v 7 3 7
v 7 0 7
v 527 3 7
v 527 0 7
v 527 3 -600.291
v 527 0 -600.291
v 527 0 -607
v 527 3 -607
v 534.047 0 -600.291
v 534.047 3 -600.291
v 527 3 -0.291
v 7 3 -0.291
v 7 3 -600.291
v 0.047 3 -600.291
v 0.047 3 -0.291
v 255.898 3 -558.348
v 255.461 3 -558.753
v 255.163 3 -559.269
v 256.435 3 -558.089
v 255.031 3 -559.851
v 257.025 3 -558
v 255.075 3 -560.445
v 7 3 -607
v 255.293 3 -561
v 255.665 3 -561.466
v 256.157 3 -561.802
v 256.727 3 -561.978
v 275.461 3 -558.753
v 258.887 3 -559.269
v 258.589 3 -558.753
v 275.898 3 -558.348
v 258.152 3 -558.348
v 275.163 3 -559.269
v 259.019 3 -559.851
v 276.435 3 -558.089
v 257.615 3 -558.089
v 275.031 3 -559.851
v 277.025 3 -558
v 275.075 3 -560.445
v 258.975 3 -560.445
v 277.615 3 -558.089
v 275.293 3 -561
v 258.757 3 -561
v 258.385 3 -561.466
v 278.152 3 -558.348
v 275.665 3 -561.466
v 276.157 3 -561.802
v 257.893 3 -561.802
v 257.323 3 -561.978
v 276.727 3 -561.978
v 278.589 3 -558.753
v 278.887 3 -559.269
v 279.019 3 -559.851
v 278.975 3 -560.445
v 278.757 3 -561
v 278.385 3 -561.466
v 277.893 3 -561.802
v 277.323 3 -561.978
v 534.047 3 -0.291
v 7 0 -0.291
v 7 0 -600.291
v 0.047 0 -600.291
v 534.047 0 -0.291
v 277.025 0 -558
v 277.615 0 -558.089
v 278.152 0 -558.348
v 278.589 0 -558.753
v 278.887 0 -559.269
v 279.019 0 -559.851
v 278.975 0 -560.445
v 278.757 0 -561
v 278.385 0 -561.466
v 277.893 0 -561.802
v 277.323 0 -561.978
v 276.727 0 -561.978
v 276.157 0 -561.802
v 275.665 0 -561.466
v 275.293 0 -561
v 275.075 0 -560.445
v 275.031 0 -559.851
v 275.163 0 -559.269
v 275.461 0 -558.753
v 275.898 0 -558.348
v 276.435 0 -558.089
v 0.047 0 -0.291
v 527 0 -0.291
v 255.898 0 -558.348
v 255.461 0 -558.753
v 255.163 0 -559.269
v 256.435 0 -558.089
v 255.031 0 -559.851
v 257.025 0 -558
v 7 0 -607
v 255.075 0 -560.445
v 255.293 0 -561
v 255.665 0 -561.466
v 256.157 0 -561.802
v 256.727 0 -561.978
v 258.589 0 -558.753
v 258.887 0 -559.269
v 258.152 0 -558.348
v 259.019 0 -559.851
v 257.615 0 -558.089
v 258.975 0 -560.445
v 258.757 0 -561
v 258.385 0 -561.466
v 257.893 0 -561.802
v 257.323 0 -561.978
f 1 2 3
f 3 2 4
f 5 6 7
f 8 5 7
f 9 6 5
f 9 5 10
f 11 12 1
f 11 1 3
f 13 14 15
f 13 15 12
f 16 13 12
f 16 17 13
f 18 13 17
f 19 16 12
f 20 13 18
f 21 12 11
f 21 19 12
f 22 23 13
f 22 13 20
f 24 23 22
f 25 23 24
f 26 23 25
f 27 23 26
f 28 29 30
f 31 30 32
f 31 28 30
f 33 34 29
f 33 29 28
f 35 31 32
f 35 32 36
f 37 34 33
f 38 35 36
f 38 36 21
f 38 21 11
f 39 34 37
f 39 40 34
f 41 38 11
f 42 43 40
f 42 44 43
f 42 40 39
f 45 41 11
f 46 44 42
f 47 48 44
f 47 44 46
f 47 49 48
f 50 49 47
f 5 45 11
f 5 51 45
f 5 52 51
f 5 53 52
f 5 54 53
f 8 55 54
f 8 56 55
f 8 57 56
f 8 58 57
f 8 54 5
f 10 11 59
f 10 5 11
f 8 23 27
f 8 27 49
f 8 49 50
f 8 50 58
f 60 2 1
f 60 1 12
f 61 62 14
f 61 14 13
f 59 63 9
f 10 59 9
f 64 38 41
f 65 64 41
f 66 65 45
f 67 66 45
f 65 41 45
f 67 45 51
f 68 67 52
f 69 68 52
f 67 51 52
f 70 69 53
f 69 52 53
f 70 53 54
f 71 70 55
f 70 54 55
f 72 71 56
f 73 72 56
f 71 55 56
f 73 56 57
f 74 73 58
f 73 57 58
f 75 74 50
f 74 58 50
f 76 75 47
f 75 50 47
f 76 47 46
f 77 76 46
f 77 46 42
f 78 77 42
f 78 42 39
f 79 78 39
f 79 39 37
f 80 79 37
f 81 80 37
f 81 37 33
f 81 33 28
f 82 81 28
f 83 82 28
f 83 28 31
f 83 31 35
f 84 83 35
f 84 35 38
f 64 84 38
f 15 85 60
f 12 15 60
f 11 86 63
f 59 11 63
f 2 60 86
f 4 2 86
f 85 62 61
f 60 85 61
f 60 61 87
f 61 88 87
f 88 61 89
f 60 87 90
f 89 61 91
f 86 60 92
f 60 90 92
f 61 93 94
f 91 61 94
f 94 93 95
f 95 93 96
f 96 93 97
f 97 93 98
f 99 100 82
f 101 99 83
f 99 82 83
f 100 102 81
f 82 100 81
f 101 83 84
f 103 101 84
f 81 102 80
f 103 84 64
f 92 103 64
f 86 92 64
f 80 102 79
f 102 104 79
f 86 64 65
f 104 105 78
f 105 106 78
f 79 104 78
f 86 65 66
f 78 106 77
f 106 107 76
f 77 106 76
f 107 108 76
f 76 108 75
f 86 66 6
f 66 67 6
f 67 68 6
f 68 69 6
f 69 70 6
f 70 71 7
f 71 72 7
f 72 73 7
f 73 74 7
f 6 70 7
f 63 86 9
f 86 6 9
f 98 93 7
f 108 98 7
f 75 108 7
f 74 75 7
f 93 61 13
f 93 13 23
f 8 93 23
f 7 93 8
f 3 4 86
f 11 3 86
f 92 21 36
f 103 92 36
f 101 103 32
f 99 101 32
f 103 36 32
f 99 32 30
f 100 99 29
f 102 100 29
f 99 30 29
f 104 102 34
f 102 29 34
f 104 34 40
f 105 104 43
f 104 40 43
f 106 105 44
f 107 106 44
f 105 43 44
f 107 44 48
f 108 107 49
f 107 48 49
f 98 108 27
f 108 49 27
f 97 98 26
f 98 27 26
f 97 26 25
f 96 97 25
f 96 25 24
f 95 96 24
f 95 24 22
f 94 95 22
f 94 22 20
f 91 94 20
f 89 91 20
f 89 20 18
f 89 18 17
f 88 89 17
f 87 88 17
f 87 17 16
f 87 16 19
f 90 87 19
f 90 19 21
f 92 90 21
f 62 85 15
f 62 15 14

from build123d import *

# Parameters (mm, degrees)
SKETCH1_W           = 534
SKETCH1_H           = 600
BOSS_EXTRUDE1_DEPTH = 3
SKETCH3_W           = 520
SKETCH3_H           = 614
BOSS_EXTRUDE2_DEPTH = 3
SKETCH4_R           = 2
CUT_EXTRUDE2_DEPTH  = 10


with BuildPart() as part:
    # Sketch1 → Boss-Extrude1 (new body)
    with BuildSketch(Plane(origin=(0, 0, 0), x_dir=(1, 0, 0), z_dir=(0, 1, 0))):
        with Locations((267.046520854, 300.291126183)):
            Rectangle(SKETCH1_W, SKETCH1_H)
    extrude(amount=BOSS_EXTRUDE1_DEPTH)

    # Sketch3 → Boss-Extrude2 (add)
    with BuildSketch(Plane(origin=(0, 0, 0), x_dir=(1, 0, 0), z_dir=(0, 1, 0))):
        with Locations((267, 300)):
            Rectangle(SKETCH3_W, SKETCH3_H)
    extrude(amount=BOSS_EXTRUDE2_DEPTH)

    # Sketch4 → Cut-Extrude2 (cut)
    with BuildSketch(Plane(origin=(0, 3, 0), x_dir=(1, 0, 0), z_dir=(0, 1, 0))):
        with Locations(Location((257.025, 560, 0), (0, 0, 270))):
            Circle(SKETCH4_R)
        with Locations(Location((277.025, 560, 0), (0, 0, 270))):
            Circle(SKETCH4_R)
    extrude(amount=-CUT_EXTRUDE2_DEPTH, mode=Mode.SUBTRACT)


solid = part.part
